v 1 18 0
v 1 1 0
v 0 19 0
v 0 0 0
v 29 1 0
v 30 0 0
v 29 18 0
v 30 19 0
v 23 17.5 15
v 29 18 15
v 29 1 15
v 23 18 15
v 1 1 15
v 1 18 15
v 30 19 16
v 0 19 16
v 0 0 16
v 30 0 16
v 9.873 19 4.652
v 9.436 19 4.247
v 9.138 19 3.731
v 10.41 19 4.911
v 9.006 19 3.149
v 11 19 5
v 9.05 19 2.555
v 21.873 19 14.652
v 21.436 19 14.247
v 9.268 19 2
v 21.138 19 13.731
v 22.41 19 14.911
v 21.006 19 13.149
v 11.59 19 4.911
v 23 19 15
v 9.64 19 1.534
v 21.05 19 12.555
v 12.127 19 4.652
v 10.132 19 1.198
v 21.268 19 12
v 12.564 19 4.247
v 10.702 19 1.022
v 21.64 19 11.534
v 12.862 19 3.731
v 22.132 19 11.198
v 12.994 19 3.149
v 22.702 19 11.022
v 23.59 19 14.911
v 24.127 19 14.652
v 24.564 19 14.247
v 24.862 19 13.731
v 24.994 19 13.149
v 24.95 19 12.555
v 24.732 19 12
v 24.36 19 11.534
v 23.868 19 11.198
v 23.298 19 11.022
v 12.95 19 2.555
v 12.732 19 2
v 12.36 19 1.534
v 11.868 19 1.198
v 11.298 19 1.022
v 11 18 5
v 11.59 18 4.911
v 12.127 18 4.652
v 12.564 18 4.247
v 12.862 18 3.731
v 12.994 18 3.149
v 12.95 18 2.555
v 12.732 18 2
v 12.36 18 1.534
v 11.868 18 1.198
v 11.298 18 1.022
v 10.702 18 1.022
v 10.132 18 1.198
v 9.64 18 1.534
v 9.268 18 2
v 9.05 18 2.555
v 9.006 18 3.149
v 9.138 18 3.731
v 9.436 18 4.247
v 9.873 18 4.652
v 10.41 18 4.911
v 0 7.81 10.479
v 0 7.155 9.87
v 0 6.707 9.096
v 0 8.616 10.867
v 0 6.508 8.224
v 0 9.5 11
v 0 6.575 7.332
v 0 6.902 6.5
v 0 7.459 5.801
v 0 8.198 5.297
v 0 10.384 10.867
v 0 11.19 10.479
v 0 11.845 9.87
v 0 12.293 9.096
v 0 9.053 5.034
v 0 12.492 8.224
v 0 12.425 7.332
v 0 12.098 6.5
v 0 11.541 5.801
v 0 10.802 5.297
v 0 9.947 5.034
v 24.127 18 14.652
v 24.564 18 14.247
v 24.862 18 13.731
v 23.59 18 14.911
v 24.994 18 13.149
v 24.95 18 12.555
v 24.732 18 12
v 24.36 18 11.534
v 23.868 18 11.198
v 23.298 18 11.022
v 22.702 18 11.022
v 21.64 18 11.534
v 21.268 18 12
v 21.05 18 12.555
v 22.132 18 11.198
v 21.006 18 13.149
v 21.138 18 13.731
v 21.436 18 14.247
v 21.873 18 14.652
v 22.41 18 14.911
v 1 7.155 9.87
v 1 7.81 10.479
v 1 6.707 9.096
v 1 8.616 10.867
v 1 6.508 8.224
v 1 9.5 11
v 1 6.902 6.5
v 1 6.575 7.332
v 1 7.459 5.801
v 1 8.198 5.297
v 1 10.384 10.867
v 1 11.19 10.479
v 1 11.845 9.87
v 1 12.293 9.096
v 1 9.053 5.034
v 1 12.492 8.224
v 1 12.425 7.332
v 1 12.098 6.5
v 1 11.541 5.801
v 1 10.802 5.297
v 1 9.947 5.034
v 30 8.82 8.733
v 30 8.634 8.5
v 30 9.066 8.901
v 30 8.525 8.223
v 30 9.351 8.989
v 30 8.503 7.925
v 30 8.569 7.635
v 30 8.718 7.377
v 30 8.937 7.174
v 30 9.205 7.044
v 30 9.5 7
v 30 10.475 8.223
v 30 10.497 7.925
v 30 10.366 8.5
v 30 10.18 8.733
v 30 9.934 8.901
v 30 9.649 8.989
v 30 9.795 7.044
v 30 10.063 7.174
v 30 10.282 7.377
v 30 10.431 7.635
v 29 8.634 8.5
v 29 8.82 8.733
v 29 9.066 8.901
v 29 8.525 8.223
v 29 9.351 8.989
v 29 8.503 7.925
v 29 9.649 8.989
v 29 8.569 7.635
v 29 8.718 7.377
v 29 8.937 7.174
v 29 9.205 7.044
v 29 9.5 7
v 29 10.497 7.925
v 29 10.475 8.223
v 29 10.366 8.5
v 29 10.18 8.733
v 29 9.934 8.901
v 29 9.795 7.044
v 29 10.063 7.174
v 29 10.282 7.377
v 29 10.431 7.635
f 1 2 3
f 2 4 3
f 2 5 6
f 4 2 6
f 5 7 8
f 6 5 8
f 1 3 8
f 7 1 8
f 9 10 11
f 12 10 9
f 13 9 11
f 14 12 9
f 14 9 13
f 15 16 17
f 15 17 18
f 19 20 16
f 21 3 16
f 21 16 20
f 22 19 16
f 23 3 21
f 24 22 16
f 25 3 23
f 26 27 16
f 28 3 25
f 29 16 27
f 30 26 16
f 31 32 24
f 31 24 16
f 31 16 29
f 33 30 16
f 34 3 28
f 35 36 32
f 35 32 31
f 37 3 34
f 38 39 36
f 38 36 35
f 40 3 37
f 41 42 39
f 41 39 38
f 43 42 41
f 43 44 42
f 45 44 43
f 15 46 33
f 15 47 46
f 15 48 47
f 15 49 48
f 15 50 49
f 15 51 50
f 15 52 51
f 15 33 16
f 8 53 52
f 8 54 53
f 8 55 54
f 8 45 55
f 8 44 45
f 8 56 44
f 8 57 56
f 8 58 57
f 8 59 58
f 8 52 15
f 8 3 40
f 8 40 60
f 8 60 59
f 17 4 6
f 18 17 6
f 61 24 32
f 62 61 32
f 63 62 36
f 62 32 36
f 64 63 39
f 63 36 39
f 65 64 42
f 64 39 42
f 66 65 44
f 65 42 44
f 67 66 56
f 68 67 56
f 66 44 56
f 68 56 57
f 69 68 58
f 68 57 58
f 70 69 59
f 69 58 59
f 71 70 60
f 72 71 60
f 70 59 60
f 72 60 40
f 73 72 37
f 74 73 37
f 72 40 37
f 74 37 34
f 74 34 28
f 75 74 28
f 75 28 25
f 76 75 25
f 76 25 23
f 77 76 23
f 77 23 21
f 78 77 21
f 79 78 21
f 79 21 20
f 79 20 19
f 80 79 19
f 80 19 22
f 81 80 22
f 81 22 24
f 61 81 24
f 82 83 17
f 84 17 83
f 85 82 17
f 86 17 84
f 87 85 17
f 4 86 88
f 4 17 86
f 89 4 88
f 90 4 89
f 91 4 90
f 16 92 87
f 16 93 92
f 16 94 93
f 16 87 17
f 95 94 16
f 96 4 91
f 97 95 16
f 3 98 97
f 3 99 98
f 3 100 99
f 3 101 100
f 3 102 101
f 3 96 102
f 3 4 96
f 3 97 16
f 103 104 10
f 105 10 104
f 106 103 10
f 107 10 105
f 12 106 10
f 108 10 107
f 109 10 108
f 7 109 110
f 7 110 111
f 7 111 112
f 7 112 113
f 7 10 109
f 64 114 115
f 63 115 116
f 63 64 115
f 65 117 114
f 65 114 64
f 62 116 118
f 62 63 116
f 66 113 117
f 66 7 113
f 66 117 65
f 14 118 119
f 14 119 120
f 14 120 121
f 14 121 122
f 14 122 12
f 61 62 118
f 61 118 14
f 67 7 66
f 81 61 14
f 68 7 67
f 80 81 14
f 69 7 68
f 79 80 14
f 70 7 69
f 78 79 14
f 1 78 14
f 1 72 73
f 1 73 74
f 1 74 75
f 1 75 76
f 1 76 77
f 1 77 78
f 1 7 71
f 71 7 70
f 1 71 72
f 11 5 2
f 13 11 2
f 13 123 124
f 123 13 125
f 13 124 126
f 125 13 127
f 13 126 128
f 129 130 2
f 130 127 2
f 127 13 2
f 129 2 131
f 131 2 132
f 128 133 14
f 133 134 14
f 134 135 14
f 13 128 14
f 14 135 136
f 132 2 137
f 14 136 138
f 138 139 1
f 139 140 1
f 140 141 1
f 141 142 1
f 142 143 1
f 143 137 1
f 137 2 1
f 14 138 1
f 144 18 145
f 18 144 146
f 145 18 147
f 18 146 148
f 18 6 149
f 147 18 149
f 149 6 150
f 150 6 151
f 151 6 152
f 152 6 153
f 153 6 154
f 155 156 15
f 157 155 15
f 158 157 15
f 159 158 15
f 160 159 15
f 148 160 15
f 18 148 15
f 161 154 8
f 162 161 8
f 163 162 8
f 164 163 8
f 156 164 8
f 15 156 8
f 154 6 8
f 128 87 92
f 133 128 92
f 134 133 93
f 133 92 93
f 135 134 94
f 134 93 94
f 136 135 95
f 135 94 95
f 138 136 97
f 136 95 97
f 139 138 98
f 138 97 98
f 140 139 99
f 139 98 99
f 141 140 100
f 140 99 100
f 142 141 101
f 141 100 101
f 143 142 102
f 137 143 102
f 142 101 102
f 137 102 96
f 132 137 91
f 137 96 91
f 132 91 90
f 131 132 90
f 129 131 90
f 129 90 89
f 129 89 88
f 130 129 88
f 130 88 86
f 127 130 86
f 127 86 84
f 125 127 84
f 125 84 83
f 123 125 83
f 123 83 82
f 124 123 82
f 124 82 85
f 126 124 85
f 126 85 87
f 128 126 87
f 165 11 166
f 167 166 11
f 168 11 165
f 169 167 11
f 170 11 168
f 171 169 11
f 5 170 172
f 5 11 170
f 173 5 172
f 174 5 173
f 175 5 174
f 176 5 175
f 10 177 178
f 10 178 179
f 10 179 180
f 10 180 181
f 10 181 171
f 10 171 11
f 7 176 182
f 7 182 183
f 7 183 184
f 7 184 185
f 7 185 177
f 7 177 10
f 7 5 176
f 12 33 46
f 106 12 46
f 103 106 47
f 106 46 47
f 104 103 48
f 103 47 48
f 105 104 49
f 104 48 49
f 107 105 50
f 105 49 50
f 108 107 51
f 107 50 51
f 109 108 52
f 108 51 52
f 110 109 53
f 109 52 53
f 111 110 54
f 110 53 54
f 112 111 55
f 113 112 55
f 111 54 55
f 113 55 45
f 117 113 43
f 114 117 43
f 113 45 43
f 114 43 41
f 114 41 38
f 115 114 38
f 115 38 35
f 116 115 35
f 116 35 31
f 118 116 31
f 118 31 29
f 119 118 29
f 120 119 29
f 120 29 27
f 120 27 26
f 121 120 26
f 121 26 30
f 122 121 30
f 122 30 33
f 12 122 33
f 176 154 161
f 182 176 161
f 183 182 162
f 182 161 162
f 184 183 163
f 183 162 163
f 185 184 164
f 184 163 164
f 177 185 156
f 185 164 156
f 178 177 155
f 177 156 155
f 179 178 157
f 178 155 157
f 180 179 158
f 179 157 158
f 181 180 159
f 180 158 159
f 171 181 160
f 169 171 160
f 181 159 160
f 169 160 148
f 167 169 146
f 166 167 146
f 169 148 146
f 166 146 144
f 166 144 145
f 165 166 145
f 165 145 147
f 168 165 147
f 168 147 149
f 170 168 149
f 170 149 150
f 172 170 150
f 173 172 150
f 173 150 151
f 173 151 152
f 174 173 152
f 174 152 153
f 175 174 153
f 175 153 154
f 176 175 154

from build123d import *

# Parameters (mm, degrees)
ESQUISSE1_W             = 30
ESQUISSE1_H             = 19
BOSS_EXTRU_1_DEPTH      = 16
ESQUISSE2_R             = 3
ENL_V_MAT_EXTRU_2_DEPTH = 29
ESQUISSE3_R             = 1
ENL_V_MAT_EXTRU_3_DEPTH = 8
ESQUISSE7_W             = 28
ESQUISSE7_H             = 17
ENL_V_MAT_EXTRU_4_DEPTH = 15
ESQUISSE8_R             = 2
ENL_V_MAT_EXTRU_7_DEPTH = 1.5


with BuildPart() as part:
    # Esquisse1 → Boss.-Extru.1 (new body)
    with BuildSketch(Plane.XY):
        with Locations((15, 9.5)):
            Rectangle(ESQUISSE1_W, ESQUISSE1_H)
    extrude(amount=BOSS_EXTRU_1_DEPTH)

    # Esquisse2 → Enlèv. mat.-Extru.2 (cut)
    with BuildSketch(Plane.ZY):
        with Locations((8, 9.5)):
            Circle(ESQUISSE2_R)
    extrude(amount=-ENL_V_MAT_EXTRU_2_DEPTH, mode=Mode.SUBTRACT)

    # Esquisse3 → Enlèv. mat.-Extru.3 (cut)
    with BuildSketch(Plane(origin=(30, 0, 0), x_dir=(0, 0, -1), z_dir=(1, 0, 0))):
        with Locations((-8, 9.5)):
            Circle(ESQUISSE3_R)
    extrude(amount=-ENL_V_MAT_EXTRU_3_DEPTH, mode=Mode.SUBTRACT)

    # Esquisse7 → Enlèv. mat.-Extru.4 (cut)
    with BuildSketch(Plane(origin=(0, 0, 0), x_dir=(-1, 0, 0), z_dir=(0, 0, -1))):
        with Locations((-15, 9.5)):
            Rectangle(ESQUISSE7_W, ESQUISSE7_H)
    extrude(amount=-ENL_V_MAT_EXTRU_4_DEPTH, mode=Mode.SUBTRACT)

    # Esquisse8 → Enlèv. mat.-Extru.7 (cut)
    with BuildSketch(Plane(origin=(0, 19, 0), x_dir=(1, 0, 0), z_dir=(0, 1, 0))):
        with Locations(Location((23, -13, 0), (0, 0, 270))):
            Circle(ESQUISSE8_R)
        with Locations(Location((11, -3, 0), (0, 0, 270))):
            Circle(ESQUISSE8_R)
    extrude(amount=-ENL_V_MAT_EXTRU_7_DEPTH, mode=Mode.SUBTRACT)


solid = part.part
